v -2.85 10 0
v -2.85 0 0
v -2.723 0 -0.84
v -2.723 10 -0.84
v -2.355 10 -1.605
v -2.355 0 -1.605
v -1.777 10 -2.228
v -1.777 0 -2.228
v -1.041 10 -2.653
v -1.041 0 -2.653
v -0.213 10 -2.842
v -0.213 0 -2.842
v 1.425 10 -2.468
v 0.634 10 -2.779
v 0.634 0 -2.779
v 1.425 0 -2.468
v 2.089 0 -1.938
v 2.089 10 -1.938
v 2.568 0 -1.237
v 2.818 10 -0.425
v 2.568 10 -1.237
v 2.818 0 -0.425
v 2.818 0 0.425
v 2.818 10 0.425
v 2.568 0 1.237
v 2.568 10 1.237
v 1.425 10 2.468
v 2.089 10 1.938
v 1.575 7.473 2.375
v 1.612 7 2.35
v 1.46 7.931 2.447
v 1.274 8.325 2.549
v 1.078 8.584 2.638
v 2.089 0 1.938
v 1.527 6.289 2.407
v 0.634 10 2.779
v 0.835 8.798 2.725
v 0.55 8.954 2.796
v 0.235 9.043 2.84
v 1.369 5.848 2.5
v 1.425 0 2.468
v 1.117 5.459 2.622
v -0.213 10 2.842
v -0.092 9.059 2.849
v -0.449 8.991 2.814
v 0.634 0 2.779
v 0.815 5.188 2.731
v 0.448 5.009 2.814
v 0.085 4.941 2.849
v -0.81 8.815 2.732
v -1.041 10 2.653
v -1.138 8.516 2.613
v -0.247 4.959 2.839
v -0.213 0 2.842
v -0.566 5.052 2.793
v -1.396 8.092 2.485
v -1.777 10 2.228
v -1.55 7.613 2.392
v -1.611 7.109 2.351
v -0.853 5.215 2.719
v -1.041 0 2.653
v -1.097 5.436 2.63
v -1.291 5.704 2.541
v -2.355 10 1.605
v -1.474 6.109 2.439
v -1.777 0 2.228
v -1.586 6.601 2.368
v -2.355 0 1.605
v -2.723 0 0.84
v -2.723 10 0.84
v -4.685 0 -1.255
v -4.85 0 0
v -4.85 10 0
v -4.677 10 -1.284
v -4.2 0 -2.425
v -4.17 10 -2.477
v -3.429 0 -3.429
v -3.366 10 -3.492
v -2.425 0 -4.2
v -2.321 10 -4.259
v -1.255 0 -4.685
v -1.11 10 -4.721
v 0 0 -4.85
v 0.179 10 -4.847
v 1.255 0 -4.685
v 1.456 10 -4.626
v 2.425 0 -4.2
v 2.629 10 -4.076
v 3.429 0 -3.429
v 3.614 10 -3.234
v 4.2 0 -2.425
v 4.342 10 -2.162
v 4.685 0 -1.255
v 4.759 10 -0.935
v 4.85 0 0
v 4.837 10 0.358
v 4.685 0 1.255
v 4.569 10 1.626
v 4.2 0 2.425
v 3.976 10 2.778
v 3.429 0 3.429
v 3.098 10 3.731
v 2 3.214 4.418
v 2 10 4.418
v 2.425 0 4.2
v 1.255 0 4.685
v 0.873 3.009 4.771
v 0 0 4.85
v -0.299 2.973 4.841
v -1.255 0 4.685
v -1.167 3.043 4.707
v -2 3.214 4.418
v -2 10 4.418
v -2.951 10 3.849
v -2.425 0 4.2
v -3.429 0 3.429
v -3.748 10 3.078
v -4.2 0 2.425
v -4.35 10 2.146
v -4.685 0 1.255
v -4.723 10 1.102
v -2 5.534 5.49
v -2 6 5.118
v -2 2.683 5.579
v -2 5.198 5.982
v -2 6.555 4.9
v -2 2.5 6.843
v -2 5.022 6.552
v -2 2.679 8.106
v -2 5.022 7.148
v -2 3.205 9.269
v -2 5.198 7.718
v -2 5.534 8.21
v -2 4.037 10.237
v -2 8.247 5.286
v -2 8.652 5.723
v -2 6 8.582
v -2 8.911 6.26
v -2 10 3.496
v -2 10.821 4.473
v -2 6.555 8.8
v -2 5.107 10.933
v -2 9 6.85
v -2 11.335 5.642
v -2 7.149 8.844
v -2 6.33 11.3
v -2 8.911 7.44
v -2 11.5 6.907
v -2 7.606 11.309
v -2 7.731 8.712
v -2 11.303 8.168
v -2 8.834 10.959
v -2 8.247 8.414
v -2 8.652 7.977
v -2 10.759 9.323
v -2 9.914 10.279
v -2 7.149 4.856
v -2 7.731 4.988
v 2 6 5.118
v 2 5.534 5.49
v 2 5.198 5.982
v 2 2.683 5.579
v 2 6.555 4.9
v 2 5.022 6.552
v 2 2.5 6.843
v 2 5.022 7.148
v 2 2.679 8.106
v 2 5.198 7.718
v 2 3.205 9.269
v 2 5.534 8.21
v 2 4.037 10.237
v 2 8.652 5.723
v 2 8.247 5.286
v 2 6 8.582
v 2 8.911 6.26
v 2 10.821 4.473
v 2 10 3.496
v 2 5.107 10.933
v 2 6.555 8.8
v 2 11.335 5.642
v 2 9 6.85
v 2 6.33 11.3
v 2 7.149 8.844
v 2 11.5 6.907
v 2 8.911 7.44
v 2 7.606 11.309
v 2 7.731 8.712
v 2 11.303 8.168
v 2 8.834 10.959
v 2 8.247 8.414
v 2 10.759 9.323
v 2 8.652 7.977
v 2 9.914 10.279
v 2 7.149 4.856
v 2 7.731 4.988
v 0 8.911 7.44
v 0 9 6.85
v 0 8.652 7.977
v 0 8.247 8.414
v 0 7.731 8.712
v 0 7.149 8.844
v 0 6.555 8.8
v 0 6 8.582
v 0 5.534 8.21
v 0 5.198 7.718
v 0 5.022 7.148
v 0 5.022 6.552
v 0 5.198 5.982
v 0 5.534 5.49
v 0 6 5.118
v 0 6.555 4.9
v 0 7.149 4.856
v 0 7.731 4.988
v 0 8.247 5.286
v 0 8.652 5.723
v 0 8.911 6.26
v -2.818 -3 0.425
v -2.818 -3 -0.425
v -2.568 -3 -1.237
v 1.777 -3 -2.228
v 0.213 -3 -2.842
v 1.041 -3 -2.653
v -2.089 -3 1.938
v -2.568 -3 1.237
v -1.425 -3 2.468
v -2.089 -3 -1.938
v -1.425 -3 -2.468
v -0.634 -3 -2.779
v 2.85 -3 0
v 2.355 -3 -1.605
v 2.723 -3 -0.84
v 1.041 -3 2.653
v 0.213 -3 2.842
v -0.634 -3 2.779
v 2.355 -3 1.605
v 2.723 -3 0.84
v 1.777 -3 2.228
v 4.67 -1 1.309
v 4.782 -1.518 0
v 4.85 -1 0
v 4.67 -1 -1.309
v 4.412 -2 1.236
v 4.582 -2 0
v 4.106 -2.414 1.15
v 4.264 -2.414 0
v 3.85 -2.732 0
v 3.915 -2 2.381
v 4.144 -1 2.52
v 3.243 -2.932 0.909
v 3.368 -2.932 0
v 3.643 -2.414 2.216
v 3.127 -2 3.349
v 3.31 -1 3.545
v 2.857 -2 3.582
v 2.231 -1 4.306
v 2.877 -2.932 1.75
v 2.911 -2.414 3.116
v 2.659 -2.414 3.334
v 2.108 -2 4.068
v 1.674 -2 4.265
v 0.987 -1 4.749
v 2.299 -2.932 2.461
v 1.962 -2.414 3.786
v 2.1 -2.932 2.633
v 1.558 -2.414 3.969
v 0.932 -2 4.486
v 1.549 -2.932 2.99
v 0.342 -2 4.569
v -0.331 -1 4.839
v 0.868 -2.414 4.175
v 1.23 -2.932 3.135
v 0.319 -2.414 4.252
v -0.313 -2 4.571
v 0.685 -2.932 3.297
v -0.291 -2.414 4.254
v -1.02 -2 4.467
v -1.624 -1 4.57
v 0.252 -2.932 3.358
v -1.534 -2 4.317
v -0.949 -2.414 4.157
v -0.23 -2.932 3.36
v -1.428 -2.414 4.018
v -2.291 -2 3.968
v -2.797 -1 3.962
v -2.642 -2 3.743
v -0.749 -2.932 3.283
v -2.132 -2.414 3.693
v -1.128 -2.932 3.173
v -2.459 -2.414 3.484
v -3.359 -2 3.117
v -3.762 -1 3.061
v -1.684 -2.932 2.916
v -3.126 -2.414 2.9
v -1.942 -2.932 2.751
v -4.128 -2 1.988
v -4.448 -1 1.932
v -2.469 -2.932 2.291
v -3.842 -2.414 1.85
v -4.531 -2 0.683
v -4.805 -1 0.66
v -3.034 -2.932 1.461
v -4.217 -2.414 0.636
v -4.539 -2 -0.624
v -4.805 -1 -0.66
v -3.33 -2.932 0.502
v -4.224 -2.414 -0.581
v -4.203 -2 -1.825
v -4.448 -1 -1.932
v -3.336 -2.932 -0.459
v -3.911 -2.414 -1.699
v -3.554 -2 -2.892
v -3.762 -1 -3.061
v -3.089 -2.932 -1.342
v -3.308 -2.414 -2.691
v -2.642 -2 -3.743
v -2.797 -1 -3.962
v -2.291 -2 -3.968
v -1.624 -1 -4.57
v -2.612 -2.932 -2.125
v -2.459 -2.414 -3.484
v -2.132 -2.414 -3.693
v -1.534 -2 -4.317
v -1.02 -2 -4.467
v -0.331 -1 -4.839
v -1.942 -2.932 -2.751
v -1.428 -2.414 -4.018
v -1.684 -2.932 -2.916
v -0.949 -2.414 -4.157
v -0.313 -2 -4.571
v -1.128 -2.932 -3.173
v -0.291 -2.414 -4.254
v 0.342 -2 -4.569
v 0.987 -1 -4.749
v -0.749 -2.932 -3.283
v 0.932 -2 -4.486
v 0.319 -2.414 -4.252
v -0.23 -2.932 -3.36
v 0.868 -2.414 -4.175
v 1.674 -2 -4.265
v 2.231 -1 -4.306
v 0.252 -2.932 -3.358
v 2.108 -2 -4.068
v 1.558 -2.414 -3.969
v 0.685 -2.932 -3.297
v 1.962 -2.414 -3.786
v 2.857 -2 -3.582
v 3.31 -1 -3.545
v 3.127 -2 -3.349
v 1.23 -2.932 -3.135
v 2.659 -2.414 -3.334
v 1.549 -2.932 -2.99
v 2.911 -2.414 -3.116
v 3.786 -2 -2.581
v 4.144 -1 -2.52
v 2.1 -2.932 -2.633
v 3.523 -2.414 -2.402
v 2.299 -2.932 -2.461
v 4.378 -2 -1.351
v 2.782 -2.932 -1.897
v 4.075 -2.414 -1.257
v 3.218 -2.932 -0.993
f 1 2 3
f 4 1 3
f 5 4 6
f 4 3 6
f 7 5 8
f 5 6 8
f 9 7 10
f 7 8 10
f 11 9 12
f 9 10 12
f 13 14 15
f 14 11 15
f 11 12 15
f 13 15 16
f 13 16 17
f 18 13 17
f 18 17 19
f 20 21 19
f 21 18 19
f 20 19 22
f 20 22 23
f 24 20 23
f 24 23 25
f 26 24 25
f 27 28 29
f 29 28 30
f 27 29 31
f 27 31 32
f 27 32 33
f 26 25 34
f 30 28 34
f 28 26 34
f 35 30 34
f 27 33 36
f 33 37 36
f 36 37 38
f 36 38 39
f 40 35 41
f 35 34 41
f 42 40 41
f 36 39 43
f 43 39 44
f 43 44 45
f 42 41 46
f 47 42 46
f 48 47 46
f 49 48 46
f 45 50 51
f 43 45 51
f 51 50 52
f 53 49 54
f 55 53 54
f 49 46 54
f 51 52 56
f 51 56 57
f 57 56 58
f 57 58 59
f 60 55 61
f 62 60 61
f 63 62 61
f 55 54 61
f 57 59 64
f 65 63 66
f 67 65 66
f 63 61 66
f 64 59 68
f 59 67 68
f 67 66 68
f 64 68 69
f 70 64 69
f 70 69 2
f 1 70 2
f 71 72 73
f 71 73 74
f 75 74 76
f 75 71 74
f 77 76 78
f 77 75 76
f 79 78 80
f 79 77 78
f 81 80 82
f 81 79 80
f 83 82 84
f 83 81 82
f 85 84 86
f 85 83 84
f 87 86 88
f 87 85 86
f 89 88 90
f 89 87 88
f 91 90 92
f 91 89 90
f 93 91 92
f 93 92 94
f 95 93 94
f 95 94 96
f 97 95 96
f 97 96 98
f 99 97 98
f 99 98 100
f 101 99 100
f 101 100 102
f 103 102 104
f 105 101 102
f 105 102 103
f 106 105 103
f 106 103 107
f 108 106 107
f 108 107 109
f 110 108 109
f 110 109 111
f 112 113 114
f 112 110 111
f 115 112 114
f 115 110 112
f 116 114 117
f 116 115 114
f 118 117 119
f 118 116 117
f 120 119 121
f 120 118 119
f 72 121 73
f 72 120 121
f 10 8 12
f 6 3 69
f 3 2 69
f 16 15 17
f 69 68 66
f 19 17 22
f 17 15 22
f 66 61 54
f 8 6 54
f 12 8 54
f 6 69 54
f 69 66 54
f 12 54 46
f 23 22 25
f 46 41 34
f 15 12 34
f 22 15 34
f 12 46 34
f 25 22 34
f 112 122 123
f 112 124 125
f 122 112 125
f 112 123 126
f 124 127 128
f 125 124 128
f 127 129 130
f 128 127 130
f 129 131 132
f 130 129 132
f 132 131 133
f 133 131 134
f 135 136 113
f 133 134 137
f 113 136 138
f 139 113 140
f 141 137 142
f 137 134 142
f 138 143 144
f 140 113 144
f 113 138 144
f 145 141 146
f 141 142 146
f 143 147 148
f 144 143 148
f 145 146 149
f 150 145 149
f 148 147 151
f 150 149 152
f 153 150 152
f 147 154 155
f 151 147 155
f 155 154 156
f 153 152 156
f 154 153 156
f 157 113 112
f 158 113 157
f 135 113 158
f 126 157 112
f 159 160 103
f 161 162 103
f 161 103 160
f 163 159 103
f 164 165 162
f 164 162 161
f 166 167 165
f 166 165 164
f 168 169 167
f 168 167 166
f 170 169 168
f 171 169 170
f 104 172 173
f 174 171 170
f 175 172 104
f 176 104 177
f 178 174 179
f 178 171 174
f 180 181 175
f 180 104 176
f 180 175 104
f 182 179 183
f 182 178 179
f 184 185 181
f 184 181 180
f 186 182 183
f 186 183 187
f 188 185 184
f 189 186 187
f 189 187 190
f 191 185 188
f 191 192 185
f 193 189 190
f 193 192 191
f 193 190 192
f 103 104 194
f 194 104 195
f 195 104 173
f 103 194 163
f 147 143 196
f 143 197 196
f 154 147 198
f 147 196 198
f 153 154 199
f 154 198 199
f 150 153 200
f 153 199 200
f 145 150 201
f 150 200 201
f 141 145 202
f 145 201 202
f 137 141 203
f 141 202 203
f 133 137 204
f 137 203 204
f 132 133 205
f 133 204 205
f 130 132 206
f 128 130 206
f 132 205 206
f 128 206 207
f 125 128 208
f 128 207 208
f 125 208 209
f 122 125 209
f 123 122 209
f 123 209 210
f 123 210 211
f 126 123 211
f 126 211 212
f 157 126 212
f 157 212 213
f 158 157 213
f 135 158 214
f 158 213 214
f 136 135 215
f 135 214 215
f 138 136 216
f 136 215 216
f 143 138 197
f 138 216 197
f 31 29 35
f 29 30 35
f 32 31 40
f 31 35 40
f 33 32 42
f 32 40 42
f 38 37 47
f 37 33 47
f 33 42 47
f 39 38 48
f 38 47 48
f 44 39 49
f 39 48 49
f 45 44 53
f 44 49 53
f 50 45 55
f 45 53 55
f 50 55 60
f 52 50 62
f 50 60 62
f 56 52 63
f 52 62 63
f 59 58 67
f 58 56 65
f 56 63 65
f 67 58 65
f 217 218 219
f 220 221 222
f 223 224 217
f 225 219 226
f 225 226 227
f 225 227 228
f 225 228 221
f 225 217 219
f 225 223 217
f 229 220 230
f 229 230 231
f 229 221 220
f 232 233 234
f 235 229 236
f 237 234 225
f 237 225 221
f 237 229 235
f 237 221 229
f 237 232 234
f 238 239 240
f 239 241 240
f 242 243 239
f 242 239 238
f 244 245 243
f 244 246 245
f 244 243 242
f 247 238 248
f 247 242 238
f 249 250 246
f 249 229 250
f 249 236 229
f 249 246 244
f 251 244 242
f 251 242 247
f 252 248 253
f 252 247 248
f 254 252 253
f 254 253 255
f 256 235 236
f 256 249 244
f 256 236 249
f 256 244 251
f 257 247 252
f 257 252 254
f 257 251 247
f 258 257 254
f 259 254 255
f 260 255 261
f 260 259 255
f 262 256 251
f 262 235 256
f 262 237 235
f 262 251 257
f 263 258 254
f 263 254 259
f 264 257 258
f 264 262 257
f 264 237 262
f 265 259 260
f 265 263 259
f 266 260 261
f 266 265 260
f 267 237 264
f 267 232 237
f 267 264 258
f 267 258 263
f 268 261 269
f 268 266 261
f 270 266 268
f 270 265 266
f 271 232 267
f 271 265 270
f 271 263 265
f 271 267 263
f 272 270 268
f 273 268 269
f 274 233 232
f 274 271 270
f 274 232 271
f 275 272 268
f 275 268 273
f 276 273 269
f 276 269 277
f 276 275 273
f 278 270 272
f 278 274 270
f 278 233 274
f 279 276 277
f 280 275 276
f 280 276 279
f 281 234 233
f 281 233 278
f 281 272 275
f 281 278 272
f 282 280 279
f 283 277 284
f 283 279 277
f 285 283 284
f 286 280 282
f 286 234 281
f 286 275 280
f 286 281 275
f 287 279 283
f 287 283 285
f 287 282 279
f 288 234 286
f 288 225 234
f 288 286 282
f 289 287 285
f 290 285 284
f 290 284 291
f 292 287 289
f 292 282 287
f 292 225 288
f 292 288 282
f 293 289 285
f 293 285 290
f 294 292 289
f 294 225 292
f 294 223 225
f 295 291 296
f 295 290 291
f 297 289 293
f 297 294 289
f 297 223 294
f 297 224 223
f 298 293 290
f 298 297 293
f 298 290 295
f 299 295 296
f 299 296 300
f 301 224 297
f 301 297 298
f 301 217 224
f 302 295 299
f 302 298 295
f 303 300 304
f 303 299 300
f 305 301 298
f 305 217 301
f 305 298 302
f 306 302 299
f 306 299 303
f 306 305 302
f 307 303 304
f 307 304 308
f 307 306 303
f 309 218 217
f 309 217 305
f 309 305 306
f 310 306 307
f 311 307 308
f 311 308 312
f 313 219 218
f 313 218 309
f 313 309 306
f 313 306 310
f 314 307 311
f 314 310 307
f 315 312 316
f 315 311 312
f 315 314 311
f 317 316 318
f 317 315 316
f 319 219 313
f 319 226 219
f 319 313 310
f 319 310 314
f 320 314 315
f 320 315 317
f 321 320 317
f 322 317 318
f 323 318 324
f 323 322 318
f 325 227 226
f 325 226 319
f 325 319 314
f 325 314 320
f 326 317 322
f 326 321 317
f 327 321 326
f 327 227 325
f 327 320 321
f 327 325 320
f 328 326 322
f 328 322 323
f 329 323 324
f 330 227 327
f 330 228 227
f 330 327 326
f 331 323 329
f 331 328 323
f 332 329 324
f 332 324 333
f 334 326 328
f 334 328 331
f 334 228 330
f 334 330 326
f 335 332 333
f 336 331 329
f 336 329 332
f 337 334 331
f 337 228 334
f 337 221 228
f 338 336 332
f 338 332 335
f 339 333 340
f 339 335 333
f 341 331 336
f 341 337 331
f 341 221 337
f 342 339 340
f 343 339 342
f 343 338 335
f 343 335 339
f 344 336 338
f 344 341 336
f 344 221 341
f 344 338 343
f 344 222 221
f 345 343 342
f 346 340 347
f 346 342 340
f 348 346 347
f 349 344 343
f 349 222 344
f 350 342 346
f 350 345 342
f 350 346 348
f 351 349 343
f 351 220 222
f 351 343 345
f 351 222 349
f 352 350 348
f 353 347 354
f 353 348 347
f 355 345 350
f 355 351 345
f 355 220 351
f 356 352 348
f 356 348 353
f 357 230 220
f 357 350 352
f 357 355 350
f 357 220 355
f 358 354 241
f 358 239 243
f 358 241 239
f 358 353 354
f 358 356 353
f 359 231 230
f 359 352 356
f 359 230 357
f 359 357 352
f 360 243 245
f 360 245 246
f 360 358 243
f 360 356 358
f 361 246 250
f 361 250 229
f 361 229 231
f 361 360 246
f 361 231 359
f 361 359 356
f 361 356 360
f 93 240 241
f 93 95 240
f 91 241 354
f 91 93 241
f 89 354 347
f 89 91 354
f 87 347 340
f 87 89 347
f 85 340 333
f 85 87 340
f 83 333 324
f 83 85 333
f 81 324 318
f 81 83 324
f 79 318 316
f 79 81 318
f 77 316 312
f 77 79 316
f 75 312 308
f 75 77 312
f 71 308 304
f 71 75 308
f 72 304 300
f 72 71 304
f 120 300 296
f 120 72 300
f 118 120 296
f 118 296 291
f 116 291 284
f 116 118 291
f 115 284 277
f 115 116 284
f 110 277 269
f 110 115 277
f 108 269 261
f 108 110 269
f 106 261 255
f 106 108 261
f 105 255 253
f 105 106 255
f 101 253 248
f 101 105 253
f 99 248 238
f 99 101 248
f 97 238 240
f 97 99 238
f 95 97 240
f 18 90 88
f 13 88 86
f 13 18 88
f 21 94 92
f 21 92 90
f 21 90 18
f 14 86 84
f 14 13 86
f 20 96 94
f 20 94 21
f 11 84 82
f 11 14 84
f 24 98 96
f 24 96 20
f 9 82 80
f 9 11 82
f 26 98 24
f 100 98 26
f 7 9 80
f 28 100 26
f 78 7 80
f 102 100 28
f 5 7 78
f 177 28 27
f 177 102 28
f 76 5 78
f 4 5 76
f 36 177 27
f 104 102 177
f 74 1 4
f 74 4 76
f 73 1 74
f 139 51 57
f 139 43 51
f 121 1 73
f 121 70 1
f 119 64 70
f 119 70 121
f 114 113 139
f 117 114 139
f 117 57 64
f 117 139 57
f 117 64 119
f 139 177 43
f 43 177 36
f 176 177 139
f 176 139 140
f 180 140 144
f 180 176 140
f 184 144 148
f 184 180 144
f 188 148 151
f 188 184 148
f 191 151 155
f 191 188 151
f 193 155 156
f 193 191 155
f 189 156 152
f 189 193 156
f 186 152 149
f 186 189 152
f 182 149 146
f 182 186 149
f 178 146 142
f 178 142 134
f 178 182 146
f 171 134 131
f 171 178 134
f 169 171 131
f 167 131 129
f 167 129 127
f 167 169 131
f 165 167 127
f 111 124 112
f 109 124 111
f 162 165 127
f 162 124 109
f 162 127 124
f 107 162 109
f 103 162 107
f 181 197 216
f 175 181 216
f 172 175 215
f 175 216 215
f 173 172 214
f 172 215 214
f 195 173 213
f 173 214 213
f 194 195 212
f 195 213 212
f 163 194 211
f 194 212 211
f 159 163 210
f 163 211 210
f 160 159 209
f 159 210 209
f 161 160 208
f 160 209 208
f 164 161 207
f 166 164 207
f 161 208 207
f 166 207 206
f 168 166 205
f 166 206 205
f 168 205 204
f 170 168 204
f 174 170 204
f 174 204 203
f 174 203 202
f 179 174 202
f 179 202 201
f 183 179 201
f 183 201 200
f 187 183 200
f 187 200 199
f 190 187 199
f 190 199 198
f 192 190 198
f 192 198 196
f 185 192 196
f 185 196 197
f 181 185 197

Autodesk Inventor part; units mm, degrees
ref_plane "YZ Plane" through (0, 0, 0) normal (1, 0, 0) x (0, 1, 0)
ref_plane "XZ Plane" through (0, 0, 0) normal (0, 1, 0) x (-1, 0, 0)
ref_plane "XY Plane" through (0, 0, 0) normal (0, 0, 1) x (1, 0, 0)
sketch "Sketch1" plane through (0, 0, 0) normal (0, 1, 0) x (-1, 0, 0)
  circle A0 centre (0, 0) radius 2.85
  circle A1 centre (0, 0) radius 4.85
  dimension "d0" = 5.7
  dimension "d1" = 2
extrude "Extrusion1" add sketch "Sketch1" along normal blind 10
sketch "Sketch2" plane through (0, 0, 0) normal (1, 0, 0) x (0, 1, 0)
  circle A0 centre (7, 6.85) radius 2
  circle A1 centre (7, 6.85) radius 4.5
  line L0 (10, -4.85) -> (10, 4.85) projected
  line L1 (0, -4.85) -> (0, 4.85) projected
  line L2 (0, 4.85) -> (10, 4.85) projected
  point P0 (0, 0)
  dimension "d4" = 4
  dimension "d5" = 9
  dimension "d6" = 7
extrude "Extrusion2" add sketch "Sketch2" along normal mid plane 4
sketch "Sketch3" plane through (0, 0, 0) normal (0, -1, 0) x (1, 0, 0)
  circle A0 centre (0, 0) radius 4.85 projected
  circle A1 centre (0, 0) radius 2.85 projected
extrude "Extrusion3" add sketch "Sketch3" along normal blind 3 contours A0 | A1
fillet "Fillet1" radius 2 1 edges at (-4.85, -3, 0)
extrude "Extrusion4" cut sketch "Sketch1" along normal blind 100 contours A0
properties part number "Landing_leg_shoe"
